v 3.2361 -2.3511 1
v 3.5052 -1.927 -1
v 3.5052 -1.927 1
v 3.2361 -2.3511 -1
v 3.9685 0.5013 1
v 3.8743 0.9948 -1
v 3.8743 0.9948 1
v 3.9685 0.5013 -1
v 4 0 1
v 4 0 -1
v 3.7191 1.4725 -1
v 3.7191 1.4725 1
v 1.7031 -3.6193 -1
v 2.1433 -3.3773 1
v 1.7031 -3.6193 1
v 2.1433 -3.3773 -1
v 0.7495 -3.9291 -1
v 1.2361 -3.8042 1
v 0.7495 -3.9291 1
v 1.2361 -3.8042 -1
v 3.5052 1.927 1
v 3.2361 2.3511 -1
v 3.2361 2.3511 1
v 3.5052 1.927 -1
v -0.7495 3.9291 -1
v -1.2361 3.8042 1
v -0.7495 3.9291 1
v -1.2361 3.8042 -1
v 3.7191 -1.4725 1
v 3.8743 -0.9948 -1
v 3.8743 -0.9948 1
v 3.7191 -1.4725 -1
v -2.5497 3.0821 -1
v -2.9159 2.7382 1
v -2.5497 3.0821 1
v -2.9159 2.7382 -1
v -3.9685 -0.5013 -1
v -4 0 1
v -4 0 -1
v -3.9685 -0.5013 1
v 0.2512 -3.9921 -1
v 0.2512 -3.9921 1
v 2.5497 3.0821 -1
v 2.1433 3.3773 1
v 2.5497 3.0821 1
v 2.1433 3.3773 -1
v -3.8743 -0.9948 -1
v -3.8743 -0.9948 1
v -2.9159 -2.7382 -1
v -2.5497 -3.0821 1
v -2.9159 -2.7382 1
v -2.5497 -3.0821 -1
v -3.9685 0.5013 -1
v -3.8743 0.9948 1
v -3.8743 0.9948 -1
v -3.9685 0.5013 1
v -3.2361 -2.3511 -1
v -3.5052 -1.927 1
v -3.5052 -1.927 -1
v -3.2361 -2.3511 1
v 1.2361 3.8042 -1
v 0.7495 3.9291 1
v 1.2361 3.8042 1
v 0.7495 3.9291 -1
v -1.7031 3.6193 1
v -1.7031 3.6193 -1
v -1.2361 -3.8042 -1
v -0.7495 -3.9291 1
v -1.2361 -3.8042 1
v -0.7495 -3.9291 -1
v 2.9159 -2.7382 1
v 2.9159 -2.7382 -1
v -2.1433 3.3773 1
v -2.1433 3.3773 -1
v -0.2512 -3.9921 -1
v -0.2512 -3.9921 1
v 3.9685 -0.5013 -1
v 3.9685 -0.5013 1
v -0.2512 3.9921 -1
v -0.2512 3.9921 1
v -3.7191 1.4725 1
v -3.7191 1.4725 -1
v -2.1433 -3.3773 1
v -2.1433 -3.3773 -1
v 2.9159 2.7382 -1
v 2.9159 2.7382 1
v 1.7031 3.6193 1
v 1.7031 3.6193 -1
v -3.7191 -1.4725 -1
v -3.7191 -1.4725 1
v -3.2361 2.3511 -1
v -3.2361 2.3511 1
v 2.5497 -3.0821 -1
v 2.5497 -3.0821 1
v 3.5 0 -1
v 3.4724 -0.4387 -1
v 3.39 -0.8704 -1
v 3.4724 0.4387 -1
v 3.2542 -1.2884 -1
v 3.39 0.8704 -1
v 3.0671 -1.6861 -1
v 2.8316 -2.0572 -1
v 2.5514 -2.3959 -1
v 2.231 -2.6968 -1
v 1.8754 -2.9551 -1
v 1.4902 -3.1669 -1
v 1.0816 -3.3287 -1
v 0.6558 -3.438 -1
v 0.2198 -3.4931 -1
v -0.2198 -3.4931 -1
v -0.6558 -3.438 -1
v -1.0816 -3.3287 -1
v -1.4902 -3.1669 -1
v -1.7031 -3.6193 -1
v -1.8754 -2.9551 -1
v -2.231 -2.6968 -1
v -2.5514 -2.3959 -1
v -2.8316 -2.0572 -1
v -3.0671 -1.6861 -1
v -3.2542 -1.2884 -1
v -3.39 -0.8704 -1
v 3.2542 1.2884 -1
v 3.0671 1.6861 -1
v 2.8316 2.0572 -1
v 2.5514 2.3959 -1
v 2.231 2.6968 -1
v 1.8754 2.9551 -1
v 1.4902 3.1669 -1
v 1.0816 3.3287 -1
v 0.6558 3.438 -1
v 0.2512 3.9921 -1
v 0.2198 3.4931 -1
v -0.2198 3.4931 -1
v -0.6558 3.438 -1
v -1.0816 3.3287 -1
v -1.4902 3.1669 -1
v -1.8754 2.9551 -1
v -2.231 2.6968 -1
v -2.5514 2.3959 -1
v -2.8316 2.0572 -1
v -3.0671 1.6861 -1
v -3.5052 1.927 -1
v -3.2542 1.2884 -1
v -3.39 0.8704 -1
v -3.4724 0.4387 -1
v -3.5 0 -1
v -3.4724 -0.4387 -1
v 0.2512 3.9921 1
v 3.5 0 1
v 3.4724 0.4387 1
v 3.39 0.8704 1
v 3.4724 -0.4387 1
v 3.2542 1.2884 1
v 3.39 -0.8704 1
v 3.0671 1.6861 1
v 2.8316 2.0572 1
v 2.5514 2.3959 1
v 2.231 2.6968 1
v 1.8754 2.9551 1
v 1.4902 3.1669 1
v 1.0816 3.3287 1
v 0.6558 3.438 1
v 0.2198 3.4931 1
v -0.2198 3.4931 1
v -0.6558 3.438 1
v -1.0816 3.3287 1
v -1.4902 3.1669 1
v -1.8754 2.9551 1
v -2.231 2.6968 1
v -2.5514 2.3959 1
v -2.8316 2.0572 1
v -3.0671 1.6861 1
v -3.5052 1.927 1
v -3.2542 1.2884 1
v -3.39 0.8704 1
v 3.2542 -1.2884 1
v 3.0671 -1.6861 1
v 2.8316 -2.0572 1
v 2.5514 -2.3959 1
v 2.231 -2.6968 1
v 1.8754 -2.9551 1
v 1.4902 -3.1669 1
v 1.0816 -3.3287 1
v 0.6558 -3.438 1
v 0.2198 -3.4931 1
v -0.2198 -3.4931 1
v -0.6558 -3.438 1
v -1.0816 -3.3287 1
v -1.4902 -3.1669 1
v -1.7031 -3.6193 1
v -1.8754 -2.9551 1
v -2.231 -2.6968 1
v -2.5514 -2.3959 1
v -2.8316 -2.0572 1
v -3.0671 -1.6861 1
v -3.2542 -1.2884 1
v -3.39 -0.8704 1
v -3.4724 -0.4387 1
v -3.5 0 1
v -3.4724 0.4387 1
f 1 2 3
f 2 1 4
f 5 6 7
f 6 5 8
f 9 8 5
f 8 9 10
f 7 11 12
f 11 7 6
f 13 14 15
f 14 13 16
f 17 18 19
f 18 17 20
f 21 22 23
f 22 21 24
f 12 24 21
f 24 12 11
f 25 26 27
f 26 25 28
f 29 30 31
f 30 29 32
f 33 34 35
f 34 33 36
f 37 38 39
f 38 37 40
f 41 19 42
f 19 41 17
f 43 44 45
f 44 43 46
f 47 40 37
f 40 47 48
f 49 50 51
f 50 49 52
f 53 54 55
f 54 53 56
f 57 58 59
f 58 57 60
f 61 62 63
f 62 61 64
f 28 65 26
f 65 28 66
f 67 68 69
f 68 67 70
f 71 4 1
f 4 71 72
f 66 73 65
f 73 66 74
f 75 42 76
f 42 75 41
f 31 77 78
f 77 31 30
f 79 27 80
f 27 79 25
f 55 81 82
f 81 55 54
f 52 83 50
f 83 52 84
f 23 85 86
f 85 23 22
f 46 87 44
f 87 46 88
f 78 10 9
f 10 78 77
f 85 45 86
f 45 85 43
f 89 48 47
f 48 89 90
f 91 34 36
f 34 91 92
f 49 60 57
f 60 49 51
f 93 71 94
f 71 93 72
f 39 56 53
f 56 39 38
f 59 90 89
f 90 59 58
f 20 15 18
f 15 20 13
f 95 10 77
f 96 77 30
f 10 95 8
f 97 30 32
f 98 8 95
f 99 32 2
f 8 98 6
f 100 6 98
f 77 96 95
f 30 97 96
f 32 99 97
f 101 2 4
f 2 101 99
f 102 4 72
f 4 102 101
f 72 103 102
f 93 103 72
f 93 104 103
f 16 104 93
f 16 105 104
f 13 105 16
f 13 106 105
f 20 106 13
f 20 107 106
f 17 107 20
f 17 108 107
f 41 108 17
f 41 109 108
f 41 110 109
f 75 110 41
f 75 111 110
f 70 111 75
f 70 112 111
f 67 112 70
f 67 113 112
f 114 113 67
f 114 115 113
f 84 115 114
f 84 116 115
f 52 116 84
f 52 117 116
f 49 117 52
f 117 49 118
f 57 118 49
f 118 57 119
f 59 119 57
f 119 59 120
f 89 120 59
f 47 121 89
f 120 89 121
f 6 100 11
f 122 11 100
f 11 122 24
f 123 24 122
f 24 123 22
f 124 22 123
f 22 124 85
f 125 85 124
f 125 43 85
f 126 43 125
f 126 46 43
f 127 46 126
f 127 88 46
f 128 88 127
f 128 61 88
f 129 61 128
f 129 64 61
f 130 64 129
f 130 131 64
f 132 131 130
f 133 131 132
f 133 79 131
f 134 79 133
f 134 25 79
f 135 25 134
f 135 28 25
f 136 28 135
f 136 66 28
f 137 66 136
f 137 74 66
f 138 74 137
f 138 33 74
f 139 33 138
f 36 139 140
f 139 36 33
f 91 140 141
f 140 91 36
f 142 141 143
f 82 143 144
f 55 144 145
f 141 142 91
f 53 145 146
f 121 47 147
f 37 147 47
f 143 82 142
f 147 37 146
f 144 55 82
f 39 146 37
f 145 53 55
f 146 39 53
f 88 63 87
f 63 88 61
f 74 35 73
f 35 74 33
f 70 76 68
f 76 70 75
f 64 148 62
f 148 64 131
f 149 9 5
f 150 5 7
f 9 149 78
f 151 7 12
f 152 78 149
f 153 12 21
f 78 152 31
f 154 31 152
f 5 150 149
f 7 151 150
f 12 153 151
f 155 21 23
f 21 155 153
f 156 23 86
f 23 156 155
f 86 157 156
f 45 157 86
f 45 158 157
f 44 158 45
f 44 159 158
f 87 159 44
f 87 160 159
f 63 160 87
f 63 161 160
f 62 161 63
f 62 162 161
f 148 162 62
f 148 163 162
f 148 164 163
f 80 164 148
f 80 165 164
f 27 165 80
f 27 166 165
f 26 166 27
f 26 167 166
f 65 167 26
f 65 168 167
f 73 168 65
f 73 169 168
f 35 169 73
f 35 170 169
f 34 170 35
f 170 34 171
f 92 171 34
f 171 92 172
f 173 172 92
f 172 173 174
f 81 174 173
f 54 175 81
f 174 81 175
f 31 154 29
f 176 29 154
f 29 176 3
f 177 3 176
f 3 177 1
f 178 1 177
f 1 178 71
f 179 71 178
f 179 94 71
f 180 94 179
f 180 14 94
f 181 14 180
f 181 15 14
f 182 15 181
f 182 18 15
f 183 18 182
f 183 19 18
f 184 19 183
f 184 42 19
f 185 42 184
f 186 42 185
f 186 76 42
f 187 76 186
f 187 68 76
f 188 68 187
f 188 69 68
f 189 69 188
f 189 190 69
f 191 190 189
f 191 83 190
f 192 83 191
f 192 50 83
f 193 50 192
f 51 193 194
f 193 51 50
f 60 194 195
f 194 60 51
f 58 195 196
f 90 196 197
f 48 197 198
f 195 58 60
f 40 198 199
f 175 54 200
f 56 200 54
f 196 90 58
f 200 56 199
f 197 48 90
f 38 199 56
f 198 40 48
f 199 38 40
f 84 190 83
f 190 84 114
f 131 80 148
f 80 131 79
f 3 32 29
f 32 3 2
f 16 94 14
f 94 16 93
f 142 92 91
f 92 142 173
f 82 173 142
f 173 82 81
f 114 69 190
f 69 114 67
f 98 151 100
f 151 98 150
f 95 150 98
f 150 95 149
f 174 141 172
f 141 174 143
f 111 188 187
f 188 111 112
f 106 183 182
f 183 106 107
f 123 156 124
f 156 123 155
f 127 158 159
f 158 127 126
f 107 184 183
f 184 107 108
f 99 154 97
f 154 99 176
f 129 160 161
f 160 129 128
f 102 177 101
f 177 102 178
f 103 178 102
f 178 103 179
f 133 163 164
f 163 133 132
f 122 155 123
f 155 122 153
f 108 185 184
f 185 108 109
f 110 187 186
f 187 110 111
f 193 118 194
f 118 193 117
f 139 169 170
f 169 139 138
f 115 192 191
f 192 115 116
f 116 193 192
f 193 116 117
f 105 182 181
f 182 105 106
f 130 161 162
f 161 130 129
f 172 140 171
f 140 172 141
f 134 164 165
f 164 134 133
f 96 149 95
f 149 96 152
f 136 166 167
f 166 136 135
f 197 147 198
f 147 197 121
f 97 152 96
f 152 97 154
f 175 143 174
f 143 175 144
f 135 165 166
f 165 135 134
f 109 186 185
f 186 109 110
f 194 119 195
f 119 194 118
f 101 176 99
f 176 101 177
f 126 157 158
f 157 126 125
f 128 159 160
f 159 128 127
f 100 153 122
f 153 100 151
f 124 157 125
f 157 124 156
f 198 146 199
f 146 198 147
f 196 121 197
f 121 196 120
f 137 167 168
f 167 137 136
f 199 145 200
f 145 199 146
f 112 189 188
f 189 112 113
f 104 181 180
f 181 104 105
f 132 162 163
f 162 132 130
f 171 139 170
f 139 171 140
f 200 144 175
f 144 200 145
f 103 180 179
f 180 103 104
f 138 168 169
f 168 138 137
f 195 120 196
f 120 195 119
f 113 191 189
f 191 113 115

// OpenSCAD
$fn = 50;


difference() {
	union() {
		translate(v = [0, 0, -1.0000000000]) {
			cylinder(h = 2, r = 4.0000000000);
		}
	}
	union() {
		translate(v = [0, 0, -100.0000000000]) {
			cylinder(h = 200, r = 3.5000000000);
		}
	}
}
